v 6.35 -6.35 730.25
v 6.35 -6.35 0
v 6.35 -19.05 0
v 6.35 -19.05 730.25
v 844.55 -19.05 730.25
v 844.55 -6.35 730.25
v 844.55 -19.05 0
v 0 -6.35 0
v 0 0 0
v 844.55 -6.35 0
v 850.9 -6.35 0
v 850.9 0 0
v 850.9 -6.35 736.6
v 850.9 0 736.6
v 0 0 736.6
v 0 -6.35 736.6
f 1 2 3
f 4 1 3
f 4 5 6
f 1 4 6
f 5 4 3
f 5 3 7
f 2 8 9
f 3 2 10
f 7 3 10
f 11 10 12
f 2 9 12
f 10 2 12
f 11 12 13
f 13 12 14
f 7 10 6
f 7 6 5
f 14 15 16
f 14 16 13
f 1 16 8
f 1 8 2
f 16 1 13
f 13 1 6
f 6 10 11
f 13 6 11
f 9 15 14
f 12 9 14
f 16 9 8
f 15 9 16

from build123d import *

# Parameters (mm, degrees)
F0_W     = 850.9
F0_H     = 736.6
F1_DEPTH = 19.05
F2_W     = 6.35
F2_H     = 12.7
F4_DEPTH = 736.601
F3_W     = 12.7
F3_H     = 6.35
F5_DEPTH = 850.901


with BuildPart() as f1:
    # F0 (on Front) → F1 (new body)
    with BuildSketch(Plane.XZ):
        with Locations((425.45, 368.3)):
            Rectangle(F0_W, F0_H)
    extrude(amount=F1_DEPTH)

    # F2 (on face) → F4 (cut, through all)
    with BuildSketch(Plane(origin=(0, 0, 0), x_dir=(1, 0, 0), z_dir=(0, 0, -1))):
        with Locations((847.725, 12.7)):
            Rectangle(F2_W, F2_H)
        with Locations((3.175, 12.7)):
            Rectangle(F2_W, F2_H)
    extrude(amount=-F4_DEPTH, mode=Mode.SUBTRACT)

    # F3 (on face) → F5 (cut, through all)
    with BuildSketch(Plane.YZ.offset(850.9)):
        with Locations((-12.7, 733.425)):
            Rectangle(F3_W, F3_H)
    extrude(amount=-F5_DEPTH, mode=Mode.SUBTRACT)


solid = f1.part
